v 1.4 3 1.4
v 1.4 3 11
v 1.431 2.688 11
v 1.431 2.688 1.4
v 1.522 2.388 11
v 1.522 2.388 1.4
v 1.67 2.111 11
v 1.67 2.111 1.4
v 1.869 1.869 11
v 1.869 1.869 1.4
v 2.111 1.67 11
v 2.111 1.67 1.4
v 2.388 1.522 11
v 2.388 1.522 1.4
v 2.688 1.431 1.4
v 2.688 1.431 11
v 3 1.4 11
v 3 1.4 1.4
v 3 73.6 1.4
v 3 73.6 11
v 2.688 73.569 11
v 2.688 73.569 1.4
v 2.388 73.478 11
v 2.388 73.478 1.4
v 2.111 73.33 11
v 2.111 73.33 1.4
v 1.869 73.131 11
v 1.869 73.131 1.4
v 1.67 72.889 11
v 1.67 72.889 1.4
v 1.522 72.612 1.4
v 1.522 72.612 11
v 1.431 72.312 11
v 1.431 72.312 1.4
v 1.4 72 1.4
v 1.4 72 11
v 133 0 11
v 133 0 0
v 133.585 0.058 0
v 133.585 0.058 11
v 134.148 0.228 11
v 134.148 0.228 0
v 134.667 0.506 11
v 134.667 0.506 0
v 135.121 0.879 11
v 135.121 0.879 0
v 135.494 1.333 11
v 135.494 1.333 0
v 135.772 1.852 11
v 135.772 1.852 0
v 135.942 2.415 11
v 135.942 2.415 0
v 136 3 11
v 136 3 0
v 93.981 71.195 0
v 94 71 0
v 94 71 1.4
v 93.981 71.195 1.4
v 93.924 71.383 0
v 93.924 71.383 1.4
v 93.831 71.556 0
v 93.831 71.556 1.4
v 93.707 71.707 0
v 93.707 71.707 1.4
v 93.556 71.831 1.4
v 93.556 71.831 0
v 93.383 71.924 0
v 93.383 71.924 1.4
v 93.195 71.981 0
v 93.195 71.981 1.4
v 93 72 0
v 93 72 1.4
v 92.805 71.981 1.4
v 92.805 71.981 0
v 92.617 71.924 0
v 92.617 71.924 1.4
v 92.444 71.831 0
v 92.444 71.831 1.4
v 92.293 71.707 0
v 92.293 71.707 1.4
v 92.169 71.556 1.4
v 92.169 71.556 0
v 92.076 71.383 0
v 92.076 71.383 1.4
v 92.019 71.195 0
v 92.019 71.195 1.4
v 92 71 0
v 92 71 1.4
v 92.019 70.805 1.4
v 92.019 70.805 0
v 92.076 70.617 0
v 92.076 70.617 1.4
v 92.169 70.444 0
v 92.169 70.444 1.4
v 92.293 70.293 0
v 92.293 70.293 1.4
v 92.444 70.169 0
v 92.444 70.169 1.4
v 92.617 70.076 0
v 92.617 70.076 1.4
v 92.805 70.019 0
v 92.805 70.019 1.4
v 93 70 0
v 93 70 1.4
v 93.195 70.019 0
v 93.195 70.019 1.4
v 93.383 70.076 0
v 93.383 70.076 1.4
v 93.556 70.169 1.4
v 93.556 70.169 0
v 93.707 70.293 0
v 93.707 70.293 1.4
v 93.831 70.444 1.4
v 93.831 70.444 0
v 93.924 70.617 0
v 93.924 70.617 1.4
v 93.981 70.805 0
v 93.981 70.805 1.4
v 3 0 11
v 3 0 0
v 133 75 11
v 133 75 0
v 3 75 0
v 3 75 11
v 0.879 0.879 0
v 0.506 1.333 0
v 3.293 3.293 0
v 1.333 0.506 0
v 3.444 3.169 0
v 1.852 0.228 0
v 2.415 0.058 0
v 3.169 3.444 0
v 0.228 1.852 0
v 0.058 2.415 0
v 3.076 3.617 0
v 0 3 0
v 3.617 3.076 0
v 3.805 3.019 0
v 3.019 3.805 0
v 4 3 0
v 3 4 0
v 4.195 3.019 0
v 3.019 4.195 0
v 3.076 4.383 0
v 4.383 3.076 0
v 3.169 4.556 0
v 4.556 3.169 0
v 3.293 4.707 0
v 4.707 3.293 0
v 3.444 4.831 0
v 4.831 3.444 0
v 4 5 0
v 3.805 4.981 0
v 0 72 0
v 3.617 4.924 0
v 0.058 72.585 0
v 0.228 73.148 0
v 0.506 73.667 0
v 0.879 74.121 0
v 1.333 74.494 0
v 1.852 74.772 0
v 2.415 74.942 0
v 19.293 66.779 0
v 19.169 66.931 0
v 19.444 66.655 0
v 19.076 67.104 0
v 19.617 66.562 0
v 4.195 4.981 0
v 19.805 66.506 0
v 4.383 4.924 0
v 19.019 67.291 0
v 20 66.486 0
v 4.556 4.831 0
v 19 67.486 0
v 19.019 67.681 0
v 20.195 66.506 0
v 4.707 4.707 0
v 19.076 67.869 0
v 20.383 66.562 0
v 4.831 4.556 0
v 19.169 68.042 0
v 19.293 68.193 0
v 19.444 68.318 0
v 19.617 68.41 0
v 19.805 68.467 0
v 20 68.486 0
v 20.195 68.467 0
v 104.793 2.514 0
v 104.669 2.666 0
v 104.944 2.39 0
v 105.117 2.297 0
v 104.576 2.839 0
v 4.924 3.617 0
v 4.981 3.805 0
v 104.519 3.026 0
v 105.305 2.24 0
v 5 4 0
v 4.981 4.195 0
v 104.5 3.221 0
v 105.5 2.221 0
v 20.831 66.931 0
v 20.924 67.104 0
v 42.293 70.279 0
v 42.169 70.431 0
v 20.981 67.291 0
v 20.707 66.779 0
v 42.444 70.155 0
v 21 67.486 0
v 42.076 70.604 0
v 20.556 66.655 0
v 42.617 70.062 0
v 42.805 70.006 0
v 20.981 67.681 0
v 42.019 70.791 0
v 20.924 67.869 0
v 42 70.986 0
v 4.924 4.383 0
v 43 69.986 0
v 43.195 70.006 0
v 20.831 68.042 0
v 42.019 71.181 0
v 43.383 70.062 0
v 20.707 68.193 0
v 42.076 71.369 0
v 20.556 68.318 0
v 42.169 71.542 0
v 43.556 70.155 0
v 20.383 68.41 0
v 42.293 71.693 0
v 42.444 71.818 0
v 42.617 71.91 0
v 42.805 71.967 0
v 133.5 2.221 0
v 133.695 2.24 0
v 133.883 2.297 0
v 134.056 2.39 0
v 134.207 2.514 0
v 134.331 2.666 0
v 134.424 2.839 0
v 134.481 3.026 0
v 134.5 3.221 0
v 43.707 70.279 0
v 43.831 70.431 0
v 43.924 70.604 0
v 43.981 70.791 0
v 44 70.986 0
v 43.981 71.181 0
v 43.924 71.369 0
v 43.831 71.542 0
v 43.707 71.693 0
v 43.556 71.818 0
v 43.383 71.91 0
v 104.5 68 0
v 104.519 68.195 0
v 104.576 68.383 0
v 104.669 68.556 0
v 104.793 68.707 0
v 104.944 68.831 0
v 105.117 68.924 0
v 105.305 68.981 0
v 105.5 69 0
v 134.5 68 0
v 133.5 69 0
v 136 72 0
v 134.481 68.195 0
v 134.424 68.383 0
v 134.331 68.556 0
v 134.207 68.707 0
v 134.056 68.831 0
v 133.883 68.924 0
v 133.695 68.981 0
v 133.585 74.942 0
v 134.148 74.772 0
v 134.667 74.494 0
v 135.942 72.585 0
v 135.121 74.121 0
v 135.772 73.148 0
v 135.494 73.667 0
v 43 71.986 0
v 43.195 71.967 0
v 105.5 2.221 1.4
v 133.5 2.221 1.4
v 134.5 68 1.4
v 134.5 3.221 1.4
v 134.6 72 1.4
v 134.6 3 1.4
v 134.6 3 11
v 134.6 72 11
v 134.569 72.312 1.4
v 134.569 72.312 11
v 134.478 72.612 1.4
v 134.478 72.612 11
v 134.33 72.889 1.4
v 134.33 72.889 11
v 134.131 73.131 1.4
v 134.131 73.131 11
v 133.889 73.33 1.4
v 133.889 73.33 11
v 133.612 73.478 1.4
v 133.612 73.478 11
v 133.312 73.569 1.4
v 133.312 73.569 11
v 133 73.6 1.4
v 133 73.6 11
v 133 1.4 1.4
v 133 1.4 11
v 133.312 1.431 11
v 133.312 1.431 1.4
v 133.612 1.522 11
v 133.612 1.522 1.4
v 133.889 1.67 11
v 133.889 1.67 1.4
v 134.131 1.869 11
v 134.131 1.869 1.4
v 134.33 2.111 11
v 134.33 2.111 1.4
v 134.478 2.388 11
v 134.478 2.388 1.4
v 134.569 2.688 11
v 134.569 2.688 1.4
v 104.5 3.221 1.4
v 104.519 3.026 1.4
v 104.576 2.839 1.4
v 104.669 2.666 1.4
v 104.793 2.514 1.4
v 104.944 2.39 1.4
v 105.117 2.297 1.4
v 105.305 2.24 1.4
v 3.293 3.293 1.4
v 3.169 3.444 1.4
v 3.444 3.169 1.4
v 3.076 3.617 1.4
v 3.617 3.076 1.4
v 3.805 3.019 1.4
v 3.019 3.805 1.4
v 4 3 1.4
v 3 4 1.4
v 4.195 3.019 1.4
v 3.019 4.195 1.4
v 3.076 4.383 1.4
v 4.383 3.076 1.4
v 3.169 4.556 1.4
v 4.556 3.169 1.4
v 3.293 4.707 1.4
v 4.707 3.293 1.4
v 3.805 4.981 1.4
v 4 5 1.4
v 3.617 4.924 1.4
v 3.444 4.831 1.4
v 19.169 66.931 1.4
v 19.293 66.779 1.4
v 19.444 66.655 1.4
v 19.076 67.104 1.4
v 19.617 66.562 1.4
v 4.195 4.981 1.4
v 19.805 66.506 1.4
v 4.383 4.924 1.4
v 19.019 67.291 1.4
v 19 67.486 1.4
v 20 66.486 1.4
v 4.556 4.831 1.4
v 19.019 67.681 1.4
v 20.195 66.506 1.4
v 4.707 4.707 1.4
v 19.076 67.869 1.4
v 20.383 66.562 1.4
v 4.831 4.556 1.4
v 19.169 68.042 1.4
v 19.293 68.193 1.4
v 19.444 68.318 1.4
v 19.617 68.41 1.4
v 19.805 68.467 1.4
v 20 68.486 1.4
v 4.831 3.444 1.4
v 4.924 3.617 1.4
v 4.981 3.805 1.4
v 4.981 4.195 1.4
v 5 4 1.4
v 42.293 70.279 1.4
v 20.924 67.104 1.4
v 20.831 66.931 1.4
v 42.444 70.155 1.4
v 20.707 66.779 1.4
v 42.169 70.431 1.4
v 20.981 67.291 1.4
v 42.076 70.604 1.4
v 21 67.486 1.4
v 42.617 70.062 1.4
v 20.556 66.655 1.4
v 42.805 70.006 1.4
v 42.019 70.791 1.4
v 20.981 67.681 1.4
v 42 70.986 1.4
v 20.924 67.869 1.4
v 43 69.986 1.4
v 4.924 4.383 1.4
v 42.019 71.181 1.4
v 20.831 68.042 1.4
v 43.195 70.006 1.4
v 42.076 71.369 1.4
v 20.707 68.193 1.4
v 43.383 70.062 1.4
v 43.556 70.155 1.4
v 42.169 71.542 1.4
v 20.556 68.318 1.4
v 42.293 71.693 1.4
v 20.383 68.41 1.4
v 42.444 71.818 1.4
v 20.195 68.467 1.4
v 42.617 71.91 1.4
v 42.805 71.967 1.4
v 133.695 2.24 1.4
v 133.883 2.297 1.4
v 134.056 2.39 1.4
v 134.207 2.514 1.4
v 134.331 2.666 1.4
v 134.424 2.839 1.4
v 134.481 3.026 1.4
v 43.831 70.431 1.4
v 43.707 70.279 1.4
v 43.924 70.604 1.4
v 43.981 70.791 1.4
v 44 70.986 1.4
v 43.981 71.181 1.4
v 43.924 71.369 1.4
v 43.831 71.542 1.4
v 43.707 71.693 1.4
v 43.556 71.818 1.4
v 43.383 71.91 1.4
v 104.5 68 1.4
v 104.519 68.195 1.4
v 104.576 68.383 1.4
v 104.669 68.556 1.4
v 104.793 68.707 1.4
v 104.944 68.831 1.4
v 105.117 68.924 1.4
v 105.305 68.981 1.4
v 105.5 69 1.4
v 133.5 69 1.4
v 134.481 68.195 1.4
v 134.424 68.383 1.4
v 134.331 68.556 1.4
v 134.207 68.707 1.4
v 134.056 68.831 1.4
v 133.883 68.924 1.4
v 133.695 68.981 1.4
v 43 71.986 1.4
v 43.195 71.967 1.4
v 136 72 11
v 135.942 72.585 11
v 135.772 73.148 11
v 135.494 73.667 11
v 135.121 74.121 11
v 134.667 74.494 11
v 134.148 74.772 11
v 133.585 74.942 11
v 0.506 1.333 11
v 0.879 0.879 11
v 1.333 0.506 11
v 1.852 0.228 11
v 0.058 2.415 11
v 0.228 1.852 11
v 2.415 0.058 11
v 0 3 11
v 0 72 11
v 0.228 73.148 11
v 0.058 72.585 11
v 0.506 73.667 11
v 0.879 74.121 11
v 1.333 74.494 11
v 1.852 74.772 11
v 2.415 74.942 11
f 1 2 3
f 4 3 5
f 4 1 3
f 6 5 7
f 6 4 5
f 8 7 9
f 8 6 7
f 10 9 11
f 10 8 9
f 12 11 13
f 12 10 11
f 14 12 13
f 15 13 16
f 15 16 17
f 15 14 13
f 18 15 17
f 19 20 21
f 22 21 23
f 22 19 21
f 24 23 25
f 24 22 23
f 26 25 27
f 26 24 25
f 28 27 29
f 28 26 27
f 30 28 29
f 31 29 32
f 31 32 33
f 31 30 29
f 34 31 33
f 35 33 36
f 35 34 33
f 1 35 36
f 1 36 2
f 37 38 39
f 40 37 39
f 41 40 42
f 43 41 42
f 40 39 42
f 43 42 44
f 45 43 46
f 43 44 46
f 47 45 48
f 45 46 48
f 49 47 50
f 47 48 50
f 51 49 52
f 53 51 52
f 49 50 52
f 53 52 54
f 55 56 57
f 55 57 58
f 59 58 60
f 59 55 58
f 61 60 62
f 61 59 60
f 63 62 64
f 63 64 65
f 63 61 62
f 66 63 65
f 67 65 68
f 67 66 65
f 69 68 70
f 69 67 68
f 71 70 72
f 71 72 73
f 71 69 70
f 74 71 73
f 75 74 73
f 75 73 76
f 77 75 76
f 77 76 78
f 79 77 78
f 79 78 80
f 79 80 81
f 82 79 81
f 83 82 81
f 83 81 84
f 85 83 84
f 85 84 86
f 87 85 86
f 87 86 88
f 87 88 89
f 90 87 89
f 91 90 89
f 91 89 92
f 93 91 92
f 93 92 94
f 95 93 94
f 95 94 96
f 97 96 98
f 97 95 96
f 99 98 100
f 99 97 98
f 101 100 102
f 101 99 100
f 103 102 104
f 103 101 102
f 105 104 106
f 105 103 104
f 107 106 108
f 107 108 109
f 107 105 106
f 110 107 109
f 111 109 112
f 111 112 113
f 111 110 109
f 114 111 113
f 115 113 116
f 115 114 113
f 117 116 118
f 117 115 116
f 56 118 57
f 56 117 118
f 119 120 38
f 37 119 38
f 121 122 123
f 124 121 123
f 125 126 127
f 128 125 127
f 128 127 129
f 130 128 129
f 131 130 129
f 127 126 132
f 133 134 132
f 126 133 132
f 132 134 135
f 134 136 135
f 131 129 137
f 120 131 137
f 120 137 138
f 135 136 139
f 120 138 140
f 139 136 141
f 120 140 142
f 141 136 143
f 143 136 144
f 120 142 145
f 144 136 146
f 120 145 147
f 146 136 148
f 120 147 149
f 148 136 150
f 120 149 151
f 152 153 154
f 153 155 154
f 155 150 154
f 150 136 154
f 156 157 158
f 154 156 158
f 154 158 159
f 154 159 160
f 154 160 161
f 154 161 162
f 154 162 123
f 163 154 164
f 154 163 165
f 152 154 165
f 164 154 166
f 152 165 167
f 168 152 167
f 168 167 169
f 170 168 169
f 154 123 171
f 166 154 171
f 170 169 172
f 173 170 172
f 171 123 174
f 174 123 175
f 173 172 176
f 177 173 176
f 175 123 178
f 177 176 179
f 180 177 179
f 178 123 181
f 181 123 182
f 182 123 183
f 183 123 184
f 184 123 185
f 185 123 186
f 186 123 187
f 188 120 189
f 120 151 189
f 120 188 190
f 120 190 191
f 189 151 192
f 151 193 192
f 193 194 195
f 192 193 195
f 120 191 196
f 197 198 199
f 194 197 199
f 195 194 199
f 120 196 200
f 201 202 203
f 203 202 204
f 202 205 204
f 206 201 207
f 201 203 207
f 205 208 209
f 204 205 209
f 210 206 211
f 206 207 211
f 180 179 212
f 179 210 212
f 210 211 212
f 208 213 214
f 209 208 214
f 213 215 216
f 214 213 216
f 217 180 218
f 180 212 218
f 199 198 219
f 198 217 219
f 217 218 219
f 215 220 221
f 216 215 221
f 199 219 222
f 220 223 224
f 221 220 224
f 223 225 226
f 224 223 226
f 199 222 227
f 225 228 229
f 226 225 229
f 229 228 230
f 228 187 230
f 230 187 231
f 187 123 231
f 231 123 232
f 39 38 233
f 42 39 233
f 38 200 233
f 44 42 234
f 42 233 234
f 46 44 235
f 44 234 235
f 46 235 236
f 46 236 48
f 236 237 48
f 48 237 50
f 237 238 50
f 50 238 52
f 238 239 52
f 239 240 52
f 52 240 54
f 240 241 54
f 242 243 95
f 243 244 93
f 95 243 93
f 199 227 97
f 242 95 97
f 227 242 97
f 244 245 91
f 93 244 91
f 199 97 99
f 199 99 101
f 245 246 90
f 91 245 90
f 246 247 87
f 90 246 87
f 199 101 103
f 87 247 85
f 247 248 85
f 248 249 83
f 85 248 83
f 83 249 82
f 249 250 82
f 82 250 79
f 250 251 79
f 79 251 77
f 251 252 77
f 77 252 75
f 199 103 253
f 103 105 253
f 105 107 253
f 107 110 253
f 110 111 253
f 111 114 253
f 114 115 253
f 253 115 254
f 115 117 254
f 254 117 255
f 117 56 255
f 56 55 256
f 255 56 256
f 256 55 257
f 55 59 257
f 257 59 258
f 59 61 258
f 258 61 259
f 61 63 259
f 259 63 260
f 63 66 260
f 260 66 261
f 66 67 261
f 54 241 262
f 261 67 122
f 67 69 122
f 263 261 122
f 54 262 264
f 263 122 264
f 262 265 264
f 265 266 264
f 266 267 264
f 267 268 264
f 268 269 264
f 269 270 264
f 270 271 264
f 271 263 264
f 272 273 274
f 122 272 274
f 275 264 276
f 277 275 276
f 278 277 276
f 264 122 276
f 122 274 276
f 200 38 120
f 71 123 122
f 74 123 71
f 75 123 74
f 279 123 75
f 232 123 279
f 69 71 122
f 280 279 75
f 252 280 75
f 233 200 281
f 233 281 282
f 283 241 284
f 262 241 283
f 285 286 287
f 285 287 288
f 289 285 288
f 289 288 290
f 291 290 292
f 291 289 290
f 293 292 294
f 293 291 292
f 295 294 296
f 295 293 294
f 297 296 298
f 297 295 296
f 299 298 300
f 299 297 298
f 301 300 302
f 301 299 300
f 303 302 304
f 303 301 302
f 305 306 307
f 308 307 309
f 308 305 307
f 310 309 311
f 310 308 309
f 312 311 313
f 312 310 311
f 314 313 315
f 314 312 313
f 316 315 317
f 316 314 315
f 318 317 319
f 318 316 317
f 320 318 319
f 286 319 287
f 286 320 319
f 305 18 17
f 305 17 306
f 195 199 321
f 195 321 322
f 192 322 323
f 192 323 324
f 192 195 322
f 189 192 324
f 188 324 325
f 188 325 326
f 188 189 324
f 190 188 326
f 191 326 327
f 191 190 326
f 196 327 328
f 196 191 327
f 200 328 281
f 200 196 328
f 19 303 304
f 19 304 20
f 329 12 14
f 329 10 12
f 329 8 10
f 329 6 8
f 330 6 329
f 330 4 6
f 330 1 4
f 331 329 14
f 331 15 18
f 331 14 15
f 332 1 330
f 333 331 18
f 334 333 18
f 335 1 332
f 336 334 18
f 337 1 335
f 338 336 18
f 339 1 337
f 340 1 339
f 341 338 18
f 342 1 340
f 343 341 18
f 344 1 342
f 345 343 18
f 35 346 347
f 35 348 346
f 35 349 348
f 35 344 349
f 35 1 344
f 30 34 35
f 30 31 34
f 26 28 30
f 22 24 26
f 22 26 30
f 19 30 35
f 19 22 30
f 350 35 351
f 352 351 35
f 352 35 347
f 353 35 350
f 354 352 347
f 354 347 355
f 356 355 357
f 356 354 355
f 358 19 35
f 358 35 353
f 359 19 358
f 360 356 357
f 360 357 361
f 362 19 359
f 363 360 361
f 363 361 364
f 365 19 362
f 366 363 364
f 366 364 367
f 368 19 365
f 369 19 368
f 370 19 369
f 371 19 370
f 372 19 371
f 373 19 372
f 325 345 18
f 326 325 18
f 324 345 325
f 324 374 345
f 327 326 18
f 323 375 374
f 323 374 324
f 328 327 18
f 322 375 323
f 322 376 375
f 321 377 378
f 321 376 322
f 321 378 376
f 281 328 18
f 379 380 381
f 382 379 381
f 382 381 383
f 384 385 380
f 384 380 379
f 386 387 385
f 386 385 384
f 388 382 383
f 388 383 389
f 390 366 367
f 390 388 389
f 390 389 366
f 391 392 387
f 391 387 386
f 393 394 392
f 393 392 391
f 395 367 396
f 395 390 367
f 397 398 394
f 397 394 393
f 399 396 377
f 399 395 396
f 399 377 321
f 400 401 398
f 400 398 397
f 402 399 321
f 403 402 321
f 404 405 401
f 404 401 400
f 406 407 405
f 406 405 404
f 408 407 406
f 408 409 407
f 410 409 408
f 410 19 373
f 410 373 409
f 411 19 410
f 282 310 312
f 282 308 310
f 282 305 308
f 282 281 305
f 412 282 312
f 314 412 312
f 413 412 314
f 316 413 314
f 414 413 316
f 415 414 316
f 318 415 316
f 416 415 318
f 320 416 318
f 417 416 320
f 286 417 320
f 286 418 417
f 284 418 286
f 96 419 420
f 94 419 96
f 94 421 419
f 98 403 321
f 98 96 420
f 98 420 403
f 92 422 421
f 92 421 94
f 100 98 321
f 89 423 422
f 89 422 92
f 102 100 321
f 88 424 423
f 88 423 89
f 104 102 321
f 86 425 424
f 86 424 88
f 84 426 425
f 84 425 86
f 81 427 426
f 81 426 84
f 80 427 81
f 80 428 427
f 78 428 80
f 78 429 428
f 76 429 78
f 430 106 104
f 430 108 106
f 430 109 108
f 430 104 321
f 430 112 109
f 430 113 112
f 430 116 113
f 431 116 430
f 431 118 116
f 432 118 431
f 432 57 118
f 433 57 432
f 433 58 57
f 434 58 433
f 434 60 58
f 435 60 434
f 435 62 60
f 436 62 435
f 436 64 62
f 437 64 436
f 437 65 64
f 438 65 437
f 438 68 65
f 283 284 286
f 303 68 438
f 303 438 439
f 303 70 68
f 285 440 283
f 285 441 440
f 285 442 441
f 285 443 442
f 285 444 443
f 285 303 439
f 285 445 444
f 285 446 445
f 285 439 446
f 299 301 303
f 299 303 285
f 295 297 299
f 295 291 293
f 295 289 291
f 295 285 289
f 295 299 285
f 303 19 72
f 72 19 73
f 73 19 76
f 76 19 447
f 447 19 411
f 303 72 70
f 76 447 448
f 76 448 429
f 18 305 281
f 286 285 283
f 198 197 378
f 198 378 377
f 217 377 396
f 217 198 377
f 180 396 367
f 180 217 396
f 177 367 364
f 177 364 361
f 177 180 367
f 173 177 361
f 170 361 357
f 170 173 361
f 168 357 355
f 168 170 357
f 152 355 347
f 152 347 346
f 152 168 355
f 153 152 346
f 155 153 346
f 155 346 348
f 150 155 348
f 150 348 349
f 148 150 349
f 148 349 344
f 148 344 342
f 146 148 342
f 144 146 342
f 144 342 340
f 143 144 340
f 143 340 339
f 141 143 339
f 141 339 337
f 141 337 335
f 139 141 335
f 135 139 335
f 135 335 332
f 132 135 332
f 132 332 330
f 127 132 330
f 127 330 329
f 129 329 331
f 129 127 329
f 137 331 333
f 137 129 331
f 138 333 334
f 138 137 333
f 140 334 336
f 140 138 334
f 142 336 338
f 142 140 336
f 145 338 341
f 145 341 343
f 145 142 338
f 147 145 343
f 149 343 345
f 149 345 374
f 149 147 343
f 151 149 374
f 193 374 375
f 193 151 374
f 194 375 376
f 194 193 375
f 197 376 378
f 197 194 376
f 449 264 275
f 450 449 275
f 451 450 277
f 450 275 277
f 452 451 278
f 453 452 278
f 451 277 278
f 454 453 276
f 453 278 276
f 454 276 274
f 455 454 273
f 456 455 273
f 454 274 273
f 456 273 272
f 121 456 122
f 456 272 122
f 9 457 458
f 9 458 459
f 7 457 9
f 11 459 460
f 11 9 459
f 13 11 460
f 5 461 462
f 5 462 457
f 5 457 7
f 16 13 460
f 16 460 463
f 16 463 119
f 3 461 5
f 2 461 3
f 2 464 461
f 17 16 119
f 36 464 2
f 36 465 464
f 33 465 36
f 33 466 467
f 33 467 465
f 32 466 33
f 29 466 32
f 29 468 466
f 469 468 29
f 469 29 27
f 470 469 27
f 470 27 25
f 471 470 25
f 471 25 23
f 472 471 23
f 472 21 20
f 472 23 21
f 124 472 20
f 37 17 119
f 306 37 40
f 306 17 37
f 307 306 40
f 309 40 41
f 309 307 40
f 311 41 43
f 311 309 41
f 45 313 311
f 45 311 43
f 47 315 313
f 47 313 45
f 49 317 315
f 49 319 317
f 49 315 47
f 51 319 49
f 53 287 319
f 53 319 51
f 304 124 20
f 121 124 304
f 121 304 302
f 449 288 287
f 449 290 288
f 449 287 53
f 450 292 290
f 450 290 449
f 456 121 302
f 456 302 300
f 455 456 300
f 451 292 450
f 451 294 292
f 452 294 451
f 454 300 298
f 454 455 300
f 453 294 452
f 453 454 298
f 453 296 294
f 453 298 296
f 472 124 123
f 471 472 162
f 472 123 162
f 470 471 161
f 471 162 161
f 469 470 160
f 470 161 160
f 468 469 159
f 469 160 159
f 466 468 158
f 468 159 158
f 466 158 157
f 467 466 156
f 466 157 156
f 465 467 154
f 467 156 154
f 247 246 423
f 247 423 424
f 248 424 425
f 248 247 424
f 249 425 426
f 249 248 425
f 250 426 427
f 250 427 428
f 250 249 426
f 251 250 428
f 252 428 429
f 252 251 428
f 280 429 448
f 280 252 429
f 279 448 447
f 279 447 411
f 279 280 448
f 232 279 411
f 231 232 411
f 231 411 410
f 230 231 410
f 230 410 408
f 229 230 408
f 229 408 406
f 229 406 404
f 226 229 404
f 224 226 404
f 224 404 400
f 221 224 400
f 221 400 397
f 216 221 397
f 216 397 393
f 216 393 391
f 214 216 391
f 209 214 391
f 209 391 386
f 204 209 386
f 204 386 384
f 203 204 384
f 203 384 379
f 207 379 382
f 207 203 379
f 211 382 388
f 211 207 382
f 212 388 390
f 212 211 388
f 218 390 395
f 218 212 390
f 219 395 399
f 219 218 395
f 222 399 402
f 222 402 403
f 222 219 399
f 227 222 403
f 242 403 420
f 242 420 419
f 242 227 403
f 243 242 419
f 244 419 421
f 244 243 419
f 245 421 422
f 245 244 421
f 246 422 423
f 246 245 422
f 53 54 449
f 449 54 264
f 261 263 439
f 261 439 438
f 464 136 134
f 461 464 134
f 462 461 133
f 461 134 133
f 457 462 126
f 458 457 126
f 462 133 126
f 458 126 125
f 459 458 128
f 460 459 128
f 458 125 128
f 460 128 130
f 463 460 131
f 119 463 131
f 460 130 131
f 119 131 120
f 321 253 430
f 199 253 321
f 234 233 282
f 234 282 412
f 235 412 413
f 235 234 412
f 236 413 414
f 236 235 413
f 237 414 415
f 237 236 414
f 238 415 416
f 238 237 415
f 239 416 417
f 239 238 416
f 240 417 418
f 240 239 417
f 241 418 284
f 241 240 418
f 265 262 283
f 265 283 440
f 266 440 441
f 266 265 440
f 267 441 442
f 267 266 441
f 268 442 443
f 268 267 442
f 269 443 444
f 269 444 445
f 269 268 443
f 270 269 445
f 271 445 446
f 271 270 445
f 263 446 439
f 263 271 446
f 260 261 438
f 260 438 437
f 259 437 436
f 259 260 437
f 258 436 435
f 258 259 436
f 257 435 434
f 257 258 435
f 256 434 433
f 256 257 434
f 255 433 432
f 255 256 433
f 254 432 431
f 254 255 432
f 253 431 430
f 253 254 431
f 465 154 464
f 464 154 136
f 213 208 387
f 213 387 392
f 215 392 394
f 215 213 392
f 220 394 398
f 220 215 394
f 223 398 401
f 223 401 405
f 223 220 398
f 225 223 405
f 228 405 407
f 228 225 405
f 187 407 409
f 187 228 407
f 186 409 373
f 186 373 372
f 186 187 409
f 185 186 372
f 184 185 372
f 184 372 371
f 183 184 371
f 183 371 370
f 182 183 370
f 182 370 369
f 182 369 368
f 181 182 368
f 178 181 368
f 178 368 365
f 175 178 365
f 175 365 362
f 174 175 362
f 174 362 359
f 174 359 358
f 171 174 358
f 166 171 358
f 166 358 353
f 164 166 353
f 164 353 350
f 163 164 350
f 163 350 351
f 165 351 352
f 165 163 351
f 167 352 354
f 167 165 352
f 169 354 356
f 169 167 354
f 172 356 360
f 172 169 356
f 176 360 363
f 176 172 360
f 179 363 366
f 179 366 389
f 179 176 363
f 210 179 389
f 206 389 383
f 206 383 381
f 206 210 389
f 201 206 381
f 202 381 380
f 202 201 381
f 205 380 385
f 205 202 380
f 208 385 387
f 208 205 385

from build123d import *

# Parameters (mm, degrees)
SKETCH_R    = 1
PAD_DEPTH   = 11
THICKNESS_T = -1.4


with BuildPart() as part:
    # Sketch → Pad (new body)
    with BuildSketch(Plane.XY):
        with BuildLine():
            Line((3, 0), (133, 0))
            ThreePointArc((133, 0), (135.12132, 0.87868), (136, 3))
            Line((136, 3), (136, 72))
            ThreePointArc((136, 72), (135.12132, 74.12132), (133, 75))
            Line((133, 75), (3, 75))
            ThreePointArc((3, 75), (0.87868, 74.12132), (0, 72))
            Line((0, 72), (0, 3))
            ThreePointArc((0, 3), (0.87868, 0.87868), (3, 0))
        make_face()
        with Locations((20, 67.486328)):
            Circle(SKETCH_R, mode=Mode.SUBTRACT)
        with Locations((43, 70.986328)):
            Circle(SKETCH_R, mode=Mode.SUBTRACT)
        with Locations((93, 71)):
            Circle(SKETCH_R, mode=Mode.SUBTRACT)
        with Locations((4, 4)):
            Circle(SKETCH_R, mode=Mode.SUBTRACT)
        with BuildLine():
            Line((104.5, 68), (104.5, 3.221195))
            ThreePointArc((104.5, 3.221195), (104.792893, 2.514089), (105.5, 2.221195))
            Line((105.5, 2.221195), (133.5, 2.221195))
            ThreePointArc((133.5, 2.221195), (134.207107, 2.514089), (134.5, 3.221195))
            Line((134.5, 3.221195), (134.5, 68))
            ThreePointArc((134.5, 68), (134.207107, 68.707107), (133.5, 69))
            Line((133.5, 69), (105.5, 69))
            ThreePointArc((105.5, 69), (104.792893, 68.707107), (104.5, 68))
        make_face(mode=Mode.SUBTRACT)
    extrude(amount=PAD_DEPTH)

    # Thickness
    thickness_openings = [part.faces().sort_by_distance(p)[0] for p in [
        (55.431253, 37.938308, 11),
        (104.5, 35.610598, 5.5),
        (104.792893, 68.707107, 5.5),
        (119.5, 69, 5.5),
        (134.207107, 68.707107, 5.5),
        (134.5, 35.610598, 5.5),
        (119.5, 2.221195, 5.5),
        (134.207107, 2.514089, 5.5),
        (104.792893, 2.514089, 5.5),
        (92, 71, 5.5),
        (42, 70.986328, 5.5),
        (19, 67.486328, 5.5),
        (3, 4, 5.5),
    ]]
    offset(amount=THICKNESS_T, openings=thickness_openings)


solid = part.part
